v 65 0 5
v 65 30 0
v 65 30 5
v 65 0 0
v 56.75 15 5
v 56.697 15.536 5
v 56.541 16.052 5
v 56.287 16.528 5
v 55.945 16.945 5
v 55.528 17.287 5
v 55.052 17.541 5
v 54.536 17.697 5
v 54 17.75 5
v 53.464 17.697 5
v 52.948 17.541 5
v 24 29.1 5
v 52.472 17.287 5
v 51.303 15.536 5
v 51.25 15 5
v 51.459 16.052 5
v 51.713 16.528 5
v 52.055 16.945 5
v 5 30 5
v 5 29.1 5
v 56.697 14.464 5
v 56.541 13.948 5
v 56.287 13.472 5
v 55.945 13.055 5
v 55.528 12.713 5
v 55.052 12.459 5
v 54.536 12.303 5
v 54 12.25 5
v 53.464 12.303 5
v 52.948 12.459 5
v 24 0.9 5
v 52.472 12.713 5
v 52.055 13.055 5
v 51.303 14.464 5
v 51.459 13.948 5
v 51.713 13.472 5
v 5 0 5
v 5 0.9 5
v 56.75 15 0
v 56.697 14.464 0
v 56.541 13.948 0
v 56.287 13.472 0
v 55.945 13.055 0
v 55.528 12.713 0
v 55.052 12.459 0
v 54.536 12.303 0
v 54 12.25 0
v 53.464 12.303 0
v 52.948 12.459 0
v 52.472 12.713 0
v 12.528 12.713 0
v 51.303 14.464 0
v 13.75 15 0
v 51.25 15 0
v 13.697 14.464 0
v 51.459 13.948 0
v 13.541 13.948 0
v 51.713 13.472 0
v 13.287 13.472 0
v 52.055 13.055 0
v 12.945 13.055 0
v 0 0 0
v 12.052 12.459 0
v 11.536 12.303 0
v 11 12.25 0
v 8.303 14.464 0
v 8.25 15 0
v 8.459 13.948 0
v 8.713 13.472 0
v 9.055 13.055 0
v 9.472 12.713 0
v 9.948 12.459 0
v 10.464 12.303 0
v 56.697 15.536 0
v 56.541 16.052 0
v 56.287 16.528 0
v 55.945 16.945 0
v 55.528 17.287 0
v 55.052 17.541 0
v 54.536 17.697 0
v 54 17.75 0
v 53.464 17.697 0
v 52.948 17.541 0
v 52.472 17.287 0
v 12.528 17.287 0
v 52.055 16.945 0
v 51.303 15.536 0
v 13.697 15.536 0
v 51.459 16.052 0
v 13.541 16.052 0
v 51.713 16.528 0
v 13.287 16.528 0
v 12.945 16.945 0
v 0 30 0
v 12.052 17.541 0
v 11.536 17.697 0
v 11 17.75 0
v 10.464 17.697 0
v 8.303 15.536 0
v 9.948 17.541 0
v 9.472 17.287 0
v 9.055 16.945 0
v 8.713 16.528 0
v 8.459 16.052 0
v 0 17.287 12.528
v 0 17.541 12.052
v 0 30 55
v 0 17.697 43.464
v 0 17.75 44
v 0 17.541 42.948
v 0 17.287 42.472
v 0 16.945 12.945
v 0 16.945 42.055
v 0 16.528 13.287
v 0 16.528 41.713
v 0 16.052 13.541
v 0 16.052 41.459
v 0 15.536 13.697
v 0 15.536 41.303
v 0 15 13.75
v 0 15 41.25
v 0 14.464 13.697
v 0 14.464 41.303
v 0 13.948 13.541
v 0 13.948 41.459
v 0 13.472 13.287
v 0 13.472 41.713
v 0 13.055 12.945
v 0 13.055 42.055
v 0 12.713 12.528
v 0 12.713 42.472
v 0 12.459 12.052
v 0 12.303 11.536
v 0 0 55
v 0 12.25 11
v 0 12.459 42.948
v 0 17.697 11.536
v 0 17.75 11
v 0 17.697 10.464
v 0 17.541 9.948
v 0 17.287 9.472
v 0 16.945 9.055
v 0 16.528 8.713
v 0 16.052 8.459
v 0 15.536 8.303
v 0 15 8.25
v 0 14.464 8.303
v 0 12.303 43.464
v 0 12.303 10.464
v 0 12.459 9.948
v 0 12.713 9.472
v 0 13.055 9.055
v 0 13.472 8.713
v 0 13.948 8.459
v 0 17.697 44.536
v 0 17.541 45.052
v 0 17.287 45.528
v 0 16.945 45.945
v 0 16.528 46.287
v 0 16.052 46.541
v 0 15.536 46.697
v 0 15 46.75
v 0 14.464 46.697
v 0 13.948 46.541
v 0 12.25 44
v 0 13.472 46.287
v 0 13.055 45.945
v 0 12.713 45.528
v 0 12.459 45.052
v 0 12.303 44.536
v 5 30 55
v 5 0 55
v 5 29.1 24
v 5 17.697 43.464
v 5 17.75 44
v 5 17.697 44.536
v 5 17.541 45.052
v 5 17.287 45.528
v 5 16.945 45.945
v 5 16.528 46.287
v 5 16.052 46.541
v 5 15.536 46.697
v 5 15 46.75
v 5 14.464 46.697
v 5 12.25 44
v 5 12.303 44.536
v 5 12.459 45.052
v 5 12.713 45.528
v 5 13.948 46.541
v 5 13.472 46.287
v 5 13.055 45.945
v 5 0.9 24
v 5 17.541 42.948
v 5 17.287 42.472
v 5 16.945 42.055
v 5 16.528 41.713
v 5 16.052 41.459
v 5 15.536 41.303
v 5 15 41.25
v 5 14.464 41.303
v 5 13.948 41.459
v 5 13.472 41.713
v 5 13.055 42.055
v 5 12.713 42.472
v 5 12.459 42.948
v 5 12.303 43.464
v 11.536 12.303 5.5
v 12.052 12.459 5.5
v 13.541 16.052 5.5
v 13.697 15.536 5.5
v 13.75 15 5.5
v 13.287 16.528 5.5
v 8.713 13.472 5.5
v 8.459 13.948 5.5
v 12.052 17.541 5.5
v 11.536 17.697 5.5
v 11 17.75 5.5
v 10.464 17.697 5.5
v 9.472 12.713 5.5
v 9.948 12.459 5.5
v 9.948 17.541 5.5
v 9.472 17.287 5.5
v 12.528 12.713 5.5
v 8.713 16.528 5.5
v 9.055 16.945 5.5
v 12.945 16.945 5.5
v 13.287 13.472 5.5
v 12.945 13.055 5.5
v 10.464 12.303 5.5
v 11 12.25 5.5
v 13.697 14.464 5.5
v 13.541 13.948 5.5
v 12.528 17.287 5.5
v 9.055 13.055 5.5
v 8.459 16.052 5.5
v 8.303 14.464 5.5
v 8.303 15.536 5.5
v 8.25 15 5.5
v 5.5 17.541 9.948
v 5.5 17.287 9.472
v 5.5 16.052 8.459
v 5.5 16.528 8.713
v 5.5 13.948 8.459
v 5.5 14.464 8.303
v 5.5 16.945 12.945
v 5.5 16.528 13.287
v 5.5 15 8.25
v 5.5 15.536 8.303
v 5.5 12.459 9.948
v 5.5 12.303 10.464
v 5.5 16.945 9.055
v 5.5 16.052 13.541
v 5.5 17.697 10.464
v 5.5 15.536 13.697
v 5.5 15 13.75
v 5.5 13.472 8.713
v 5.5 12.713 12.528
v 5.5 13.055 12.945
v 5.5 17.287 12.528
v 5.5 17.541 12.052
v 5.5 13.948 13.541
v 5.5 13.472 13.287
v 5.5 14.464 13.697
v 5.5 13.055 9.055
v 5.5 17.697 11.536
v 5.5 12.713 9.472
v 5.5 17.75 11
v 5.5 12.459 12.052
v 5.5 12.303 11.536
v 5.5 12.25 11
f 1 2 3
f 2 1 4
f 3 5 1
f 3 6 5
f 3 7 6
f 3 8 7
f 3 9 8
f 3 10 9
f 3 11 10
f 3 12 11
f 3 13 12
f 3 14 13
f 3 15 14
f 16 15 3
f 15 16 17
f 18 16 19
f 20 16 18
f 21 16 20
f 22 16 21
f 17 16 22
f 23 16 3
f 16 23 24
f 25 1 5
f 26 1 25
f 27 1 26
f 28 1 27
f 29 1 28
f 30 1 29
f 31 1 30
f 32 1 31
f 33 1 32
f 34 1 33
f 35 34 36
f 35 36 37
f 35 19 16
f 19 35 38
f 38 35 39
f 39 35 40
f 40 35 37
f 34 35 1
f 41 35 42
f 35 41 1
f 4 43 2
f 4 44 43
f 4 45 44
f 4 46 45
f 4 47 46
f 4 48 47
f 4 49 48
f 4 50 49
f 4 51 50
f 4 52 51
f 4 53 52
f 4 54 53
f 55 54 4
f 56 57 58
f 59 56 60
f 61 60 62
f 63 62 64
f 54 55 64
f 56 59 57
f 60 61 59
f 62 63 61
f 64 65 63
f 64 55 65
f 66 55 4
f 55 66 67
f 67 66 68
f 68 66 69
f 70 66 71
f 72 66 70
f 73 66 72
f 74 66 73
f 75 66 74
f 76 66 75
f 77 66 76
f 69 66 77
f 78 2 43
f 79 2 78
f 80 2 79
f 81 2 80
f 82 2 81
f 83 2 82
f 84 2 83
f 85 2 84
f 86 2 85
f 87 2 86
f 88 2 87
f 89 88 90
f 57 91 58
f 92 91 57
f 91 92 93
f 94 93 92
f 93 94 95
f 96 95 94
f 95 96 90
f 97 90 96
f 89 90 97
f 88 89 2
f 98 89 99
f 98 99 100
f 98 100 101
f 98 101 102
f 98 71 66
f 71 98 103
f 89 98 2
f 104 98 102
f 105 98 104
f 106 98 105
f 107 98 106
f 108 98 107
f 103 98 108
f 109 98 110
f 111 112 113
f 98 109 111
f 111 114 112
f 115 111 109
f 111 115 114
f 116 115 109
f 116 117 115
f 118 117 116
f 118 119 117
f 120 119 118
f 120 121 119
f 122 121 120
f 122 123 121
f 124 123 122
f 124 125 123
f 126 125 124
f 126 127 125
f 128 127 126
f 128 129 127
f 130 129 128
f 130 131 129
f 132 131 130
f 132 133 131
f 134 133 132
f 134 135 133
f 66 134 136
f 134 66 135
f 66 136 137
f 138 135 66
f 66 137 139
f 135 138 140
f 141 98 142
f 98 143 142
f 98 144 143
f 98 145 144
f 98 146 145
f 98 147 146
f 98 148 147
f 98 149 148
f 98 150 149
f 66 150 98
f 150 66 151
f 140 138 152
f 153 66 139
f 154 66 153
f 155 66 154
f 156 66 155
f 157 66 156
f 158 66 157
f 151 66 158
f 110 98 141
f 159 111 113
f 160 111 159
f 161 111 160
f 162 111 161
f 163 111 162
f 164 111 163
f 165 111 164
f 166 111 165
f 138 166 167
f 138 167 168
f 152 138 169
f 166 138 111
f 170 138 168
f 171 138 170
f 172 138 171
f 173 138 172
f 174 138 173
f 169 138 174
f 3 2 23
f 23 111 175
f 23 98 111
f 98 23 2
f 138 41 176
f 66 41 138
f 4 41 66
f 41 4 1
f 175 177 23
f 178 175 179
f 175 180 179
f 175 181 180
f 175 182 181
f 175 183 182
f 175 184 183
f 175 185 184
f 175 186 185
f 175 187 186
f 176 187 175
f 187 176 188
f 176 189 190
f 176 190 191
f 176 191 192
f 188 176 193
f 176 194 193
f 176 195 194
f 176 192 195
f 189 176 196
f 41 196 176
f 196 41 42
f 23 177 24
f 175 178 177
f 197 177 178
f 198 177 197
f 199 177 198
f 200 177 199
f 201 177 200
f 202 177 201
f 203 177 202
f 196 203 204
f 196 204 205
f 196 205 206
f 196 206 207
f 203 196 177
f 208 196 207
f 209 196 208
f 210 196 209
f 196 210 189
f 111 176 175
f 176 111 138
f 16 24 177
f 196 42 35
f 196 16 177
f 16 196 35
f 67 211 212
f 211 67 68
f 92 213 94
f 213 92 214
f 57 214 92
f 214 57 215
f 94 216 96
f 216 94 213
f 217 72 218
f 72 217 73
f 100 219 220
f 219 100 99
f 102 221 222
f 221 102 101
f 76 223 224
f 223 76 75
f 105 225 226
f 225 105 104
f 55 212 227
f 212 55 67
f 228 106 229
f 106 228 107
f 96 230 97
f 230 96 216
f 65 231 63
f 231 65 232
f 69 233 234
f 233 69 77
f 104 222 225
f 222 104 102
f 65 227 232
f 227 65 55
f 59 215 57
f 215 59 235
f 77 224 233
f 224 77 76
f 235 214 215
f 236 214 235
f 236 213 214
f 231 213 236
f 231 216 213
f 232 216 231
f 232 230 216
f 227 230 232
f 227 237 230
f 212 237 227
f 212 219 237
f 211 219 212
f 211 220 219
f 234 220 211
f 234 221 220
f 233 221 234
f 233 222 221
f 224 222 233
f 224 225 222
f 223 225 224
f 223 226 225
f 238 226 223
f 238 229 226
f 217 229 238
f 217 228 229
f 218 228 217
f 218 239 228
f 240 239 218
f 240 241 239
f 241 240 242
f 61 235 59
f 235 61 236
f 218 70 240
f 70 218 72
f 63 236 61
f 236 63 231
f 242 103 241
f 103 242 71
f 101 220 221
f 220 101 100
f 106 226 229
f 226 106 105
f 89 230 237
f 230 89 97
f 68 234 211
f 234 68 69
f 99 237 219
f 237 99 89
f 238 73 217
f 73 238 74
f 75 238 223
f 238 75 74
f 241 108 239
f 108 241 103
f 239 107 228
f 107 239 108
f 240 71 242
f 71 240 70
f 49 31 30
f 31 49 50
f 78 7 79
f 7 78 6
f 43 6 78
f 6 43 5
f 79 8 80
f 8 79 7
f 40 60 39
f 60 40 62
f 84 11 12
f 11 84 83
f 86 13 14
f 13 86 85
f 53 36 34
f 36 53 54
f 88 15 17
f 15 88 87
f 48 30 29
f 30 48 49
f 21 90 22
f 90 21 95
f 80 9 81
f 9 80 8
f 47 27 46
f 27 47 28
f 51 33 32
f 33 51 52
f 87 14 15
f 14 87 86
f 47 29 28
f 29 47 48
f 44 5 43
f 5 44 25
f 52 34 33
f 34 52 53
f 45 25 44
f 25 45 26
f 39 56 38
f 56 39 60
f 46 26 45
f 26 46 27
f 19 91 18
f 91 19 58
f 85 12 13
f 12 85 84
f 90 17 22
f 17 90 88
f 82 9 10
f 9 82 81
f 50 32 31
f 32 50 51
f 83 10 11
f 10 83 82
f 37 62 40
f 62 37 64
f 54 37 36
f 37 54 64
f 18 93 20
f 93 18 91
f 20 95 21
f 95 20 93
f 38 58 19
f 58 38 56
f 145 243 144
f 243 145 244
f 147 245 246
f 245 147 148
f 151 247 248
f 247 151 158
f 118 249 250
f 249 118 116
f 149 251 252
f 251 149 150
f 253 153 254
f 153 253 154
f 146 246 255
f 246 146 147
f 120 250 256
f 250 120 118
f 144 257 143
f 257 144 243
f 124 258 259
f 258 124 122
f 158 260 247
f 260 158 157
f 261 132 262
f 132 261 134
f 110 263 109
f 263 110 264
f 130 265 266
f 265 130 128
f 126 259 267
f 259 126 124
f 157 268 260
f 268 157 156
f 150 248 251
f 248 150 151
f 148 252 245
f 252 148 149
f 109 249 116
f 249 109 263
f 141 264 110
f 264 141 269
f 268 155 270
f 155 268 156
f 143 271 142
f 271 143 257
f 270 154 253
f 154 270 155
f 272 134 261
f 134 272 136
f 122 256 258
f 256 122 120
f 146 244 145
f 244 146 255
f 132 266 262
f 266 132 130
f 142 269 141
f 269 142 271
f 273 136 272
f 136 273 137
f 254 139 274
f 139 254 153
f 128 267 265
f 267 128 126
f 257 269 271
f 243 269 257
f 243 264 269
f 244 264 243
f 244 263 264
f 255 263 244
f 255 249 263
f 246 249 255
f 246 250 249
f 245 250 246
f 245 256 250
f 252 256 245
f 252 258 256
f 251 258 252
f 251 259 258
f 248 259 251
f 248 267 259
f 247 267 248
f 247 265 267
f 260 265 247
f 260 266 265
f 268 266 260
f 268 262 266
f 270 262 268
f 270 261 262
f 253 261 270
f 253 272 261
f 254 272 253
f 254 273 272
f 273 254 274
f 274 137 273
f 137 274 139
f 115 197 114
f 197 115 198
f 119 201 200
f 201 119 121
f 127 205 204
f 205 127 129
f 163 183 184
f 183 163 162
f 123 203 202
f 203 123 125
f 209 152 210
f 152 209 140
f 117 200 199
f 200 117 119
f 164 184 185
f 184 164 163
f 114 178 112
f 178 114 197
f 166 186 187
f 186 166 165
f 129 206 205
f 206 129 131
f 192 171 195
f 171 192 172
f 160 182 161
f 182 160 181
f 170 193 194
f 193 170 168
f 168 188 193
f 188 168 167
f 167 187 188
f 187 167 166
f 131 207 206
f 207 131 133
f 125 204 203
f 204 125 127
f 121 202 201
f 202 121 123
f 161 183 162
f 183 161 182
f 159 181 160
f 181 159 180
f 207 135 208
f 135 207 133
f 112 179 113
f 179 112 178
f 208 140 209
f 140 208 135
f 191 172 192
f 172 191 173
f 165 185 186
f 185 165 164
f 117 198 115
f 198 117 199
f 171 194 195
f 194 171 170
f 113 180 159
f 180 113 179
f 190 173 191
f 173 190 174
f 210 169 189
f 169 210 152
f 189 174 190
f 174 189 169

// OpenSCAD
$fn = 32;

// ----------------------------------------------------------------------
// L-bracket: 65 x 30 x 55 mm
// ----------------------------------------------------------------------

// --- parameters (mm) ---
arm_x = 65;               // horizontal leg, X
arm_z = 55;               // vertical leg, Z
width = 30;               // bracket depth, Y
wall = 5;                 // plate thickness
hole_d = 5.5;             // clearance for M5
rib_leg = 28.1;           // gusset leg
rib_sink = 0.9;           // gusset overlap into the plates

module hole_z(px, py) {
  translate([px, py, -0.5]) cylinder(h = wall + 1, d = hole_d);
}
module hole_x(pz, py) {
  translate([-0.5, py, pz]) rotate([0, 90, 0]) cylinder(h = wall + 1, d = hole_d);
}
module gusset() {
  translate([0, width - rib_sink, 0])
    rotate([90, 0, 0])
      linear_extrude(height = width - 2 * rib_sink)
        polygon(points = [[rib_sink, rib_sink], [rib_leg, rib_sink], [rib_sink, rib_leg]]);
}

difference() {
  union() {
    /* horizontal leg */
    cube([arm_x, width, wall]);
    /* vertical leg, overlapping the corner block */
    cube([wall, width, arm_z]);
    gusset();
  }
  hole_z(11, 15);
  hole_z(54, 15);
  hole_x(11, 15);
  hole_x(44, 15);
}
